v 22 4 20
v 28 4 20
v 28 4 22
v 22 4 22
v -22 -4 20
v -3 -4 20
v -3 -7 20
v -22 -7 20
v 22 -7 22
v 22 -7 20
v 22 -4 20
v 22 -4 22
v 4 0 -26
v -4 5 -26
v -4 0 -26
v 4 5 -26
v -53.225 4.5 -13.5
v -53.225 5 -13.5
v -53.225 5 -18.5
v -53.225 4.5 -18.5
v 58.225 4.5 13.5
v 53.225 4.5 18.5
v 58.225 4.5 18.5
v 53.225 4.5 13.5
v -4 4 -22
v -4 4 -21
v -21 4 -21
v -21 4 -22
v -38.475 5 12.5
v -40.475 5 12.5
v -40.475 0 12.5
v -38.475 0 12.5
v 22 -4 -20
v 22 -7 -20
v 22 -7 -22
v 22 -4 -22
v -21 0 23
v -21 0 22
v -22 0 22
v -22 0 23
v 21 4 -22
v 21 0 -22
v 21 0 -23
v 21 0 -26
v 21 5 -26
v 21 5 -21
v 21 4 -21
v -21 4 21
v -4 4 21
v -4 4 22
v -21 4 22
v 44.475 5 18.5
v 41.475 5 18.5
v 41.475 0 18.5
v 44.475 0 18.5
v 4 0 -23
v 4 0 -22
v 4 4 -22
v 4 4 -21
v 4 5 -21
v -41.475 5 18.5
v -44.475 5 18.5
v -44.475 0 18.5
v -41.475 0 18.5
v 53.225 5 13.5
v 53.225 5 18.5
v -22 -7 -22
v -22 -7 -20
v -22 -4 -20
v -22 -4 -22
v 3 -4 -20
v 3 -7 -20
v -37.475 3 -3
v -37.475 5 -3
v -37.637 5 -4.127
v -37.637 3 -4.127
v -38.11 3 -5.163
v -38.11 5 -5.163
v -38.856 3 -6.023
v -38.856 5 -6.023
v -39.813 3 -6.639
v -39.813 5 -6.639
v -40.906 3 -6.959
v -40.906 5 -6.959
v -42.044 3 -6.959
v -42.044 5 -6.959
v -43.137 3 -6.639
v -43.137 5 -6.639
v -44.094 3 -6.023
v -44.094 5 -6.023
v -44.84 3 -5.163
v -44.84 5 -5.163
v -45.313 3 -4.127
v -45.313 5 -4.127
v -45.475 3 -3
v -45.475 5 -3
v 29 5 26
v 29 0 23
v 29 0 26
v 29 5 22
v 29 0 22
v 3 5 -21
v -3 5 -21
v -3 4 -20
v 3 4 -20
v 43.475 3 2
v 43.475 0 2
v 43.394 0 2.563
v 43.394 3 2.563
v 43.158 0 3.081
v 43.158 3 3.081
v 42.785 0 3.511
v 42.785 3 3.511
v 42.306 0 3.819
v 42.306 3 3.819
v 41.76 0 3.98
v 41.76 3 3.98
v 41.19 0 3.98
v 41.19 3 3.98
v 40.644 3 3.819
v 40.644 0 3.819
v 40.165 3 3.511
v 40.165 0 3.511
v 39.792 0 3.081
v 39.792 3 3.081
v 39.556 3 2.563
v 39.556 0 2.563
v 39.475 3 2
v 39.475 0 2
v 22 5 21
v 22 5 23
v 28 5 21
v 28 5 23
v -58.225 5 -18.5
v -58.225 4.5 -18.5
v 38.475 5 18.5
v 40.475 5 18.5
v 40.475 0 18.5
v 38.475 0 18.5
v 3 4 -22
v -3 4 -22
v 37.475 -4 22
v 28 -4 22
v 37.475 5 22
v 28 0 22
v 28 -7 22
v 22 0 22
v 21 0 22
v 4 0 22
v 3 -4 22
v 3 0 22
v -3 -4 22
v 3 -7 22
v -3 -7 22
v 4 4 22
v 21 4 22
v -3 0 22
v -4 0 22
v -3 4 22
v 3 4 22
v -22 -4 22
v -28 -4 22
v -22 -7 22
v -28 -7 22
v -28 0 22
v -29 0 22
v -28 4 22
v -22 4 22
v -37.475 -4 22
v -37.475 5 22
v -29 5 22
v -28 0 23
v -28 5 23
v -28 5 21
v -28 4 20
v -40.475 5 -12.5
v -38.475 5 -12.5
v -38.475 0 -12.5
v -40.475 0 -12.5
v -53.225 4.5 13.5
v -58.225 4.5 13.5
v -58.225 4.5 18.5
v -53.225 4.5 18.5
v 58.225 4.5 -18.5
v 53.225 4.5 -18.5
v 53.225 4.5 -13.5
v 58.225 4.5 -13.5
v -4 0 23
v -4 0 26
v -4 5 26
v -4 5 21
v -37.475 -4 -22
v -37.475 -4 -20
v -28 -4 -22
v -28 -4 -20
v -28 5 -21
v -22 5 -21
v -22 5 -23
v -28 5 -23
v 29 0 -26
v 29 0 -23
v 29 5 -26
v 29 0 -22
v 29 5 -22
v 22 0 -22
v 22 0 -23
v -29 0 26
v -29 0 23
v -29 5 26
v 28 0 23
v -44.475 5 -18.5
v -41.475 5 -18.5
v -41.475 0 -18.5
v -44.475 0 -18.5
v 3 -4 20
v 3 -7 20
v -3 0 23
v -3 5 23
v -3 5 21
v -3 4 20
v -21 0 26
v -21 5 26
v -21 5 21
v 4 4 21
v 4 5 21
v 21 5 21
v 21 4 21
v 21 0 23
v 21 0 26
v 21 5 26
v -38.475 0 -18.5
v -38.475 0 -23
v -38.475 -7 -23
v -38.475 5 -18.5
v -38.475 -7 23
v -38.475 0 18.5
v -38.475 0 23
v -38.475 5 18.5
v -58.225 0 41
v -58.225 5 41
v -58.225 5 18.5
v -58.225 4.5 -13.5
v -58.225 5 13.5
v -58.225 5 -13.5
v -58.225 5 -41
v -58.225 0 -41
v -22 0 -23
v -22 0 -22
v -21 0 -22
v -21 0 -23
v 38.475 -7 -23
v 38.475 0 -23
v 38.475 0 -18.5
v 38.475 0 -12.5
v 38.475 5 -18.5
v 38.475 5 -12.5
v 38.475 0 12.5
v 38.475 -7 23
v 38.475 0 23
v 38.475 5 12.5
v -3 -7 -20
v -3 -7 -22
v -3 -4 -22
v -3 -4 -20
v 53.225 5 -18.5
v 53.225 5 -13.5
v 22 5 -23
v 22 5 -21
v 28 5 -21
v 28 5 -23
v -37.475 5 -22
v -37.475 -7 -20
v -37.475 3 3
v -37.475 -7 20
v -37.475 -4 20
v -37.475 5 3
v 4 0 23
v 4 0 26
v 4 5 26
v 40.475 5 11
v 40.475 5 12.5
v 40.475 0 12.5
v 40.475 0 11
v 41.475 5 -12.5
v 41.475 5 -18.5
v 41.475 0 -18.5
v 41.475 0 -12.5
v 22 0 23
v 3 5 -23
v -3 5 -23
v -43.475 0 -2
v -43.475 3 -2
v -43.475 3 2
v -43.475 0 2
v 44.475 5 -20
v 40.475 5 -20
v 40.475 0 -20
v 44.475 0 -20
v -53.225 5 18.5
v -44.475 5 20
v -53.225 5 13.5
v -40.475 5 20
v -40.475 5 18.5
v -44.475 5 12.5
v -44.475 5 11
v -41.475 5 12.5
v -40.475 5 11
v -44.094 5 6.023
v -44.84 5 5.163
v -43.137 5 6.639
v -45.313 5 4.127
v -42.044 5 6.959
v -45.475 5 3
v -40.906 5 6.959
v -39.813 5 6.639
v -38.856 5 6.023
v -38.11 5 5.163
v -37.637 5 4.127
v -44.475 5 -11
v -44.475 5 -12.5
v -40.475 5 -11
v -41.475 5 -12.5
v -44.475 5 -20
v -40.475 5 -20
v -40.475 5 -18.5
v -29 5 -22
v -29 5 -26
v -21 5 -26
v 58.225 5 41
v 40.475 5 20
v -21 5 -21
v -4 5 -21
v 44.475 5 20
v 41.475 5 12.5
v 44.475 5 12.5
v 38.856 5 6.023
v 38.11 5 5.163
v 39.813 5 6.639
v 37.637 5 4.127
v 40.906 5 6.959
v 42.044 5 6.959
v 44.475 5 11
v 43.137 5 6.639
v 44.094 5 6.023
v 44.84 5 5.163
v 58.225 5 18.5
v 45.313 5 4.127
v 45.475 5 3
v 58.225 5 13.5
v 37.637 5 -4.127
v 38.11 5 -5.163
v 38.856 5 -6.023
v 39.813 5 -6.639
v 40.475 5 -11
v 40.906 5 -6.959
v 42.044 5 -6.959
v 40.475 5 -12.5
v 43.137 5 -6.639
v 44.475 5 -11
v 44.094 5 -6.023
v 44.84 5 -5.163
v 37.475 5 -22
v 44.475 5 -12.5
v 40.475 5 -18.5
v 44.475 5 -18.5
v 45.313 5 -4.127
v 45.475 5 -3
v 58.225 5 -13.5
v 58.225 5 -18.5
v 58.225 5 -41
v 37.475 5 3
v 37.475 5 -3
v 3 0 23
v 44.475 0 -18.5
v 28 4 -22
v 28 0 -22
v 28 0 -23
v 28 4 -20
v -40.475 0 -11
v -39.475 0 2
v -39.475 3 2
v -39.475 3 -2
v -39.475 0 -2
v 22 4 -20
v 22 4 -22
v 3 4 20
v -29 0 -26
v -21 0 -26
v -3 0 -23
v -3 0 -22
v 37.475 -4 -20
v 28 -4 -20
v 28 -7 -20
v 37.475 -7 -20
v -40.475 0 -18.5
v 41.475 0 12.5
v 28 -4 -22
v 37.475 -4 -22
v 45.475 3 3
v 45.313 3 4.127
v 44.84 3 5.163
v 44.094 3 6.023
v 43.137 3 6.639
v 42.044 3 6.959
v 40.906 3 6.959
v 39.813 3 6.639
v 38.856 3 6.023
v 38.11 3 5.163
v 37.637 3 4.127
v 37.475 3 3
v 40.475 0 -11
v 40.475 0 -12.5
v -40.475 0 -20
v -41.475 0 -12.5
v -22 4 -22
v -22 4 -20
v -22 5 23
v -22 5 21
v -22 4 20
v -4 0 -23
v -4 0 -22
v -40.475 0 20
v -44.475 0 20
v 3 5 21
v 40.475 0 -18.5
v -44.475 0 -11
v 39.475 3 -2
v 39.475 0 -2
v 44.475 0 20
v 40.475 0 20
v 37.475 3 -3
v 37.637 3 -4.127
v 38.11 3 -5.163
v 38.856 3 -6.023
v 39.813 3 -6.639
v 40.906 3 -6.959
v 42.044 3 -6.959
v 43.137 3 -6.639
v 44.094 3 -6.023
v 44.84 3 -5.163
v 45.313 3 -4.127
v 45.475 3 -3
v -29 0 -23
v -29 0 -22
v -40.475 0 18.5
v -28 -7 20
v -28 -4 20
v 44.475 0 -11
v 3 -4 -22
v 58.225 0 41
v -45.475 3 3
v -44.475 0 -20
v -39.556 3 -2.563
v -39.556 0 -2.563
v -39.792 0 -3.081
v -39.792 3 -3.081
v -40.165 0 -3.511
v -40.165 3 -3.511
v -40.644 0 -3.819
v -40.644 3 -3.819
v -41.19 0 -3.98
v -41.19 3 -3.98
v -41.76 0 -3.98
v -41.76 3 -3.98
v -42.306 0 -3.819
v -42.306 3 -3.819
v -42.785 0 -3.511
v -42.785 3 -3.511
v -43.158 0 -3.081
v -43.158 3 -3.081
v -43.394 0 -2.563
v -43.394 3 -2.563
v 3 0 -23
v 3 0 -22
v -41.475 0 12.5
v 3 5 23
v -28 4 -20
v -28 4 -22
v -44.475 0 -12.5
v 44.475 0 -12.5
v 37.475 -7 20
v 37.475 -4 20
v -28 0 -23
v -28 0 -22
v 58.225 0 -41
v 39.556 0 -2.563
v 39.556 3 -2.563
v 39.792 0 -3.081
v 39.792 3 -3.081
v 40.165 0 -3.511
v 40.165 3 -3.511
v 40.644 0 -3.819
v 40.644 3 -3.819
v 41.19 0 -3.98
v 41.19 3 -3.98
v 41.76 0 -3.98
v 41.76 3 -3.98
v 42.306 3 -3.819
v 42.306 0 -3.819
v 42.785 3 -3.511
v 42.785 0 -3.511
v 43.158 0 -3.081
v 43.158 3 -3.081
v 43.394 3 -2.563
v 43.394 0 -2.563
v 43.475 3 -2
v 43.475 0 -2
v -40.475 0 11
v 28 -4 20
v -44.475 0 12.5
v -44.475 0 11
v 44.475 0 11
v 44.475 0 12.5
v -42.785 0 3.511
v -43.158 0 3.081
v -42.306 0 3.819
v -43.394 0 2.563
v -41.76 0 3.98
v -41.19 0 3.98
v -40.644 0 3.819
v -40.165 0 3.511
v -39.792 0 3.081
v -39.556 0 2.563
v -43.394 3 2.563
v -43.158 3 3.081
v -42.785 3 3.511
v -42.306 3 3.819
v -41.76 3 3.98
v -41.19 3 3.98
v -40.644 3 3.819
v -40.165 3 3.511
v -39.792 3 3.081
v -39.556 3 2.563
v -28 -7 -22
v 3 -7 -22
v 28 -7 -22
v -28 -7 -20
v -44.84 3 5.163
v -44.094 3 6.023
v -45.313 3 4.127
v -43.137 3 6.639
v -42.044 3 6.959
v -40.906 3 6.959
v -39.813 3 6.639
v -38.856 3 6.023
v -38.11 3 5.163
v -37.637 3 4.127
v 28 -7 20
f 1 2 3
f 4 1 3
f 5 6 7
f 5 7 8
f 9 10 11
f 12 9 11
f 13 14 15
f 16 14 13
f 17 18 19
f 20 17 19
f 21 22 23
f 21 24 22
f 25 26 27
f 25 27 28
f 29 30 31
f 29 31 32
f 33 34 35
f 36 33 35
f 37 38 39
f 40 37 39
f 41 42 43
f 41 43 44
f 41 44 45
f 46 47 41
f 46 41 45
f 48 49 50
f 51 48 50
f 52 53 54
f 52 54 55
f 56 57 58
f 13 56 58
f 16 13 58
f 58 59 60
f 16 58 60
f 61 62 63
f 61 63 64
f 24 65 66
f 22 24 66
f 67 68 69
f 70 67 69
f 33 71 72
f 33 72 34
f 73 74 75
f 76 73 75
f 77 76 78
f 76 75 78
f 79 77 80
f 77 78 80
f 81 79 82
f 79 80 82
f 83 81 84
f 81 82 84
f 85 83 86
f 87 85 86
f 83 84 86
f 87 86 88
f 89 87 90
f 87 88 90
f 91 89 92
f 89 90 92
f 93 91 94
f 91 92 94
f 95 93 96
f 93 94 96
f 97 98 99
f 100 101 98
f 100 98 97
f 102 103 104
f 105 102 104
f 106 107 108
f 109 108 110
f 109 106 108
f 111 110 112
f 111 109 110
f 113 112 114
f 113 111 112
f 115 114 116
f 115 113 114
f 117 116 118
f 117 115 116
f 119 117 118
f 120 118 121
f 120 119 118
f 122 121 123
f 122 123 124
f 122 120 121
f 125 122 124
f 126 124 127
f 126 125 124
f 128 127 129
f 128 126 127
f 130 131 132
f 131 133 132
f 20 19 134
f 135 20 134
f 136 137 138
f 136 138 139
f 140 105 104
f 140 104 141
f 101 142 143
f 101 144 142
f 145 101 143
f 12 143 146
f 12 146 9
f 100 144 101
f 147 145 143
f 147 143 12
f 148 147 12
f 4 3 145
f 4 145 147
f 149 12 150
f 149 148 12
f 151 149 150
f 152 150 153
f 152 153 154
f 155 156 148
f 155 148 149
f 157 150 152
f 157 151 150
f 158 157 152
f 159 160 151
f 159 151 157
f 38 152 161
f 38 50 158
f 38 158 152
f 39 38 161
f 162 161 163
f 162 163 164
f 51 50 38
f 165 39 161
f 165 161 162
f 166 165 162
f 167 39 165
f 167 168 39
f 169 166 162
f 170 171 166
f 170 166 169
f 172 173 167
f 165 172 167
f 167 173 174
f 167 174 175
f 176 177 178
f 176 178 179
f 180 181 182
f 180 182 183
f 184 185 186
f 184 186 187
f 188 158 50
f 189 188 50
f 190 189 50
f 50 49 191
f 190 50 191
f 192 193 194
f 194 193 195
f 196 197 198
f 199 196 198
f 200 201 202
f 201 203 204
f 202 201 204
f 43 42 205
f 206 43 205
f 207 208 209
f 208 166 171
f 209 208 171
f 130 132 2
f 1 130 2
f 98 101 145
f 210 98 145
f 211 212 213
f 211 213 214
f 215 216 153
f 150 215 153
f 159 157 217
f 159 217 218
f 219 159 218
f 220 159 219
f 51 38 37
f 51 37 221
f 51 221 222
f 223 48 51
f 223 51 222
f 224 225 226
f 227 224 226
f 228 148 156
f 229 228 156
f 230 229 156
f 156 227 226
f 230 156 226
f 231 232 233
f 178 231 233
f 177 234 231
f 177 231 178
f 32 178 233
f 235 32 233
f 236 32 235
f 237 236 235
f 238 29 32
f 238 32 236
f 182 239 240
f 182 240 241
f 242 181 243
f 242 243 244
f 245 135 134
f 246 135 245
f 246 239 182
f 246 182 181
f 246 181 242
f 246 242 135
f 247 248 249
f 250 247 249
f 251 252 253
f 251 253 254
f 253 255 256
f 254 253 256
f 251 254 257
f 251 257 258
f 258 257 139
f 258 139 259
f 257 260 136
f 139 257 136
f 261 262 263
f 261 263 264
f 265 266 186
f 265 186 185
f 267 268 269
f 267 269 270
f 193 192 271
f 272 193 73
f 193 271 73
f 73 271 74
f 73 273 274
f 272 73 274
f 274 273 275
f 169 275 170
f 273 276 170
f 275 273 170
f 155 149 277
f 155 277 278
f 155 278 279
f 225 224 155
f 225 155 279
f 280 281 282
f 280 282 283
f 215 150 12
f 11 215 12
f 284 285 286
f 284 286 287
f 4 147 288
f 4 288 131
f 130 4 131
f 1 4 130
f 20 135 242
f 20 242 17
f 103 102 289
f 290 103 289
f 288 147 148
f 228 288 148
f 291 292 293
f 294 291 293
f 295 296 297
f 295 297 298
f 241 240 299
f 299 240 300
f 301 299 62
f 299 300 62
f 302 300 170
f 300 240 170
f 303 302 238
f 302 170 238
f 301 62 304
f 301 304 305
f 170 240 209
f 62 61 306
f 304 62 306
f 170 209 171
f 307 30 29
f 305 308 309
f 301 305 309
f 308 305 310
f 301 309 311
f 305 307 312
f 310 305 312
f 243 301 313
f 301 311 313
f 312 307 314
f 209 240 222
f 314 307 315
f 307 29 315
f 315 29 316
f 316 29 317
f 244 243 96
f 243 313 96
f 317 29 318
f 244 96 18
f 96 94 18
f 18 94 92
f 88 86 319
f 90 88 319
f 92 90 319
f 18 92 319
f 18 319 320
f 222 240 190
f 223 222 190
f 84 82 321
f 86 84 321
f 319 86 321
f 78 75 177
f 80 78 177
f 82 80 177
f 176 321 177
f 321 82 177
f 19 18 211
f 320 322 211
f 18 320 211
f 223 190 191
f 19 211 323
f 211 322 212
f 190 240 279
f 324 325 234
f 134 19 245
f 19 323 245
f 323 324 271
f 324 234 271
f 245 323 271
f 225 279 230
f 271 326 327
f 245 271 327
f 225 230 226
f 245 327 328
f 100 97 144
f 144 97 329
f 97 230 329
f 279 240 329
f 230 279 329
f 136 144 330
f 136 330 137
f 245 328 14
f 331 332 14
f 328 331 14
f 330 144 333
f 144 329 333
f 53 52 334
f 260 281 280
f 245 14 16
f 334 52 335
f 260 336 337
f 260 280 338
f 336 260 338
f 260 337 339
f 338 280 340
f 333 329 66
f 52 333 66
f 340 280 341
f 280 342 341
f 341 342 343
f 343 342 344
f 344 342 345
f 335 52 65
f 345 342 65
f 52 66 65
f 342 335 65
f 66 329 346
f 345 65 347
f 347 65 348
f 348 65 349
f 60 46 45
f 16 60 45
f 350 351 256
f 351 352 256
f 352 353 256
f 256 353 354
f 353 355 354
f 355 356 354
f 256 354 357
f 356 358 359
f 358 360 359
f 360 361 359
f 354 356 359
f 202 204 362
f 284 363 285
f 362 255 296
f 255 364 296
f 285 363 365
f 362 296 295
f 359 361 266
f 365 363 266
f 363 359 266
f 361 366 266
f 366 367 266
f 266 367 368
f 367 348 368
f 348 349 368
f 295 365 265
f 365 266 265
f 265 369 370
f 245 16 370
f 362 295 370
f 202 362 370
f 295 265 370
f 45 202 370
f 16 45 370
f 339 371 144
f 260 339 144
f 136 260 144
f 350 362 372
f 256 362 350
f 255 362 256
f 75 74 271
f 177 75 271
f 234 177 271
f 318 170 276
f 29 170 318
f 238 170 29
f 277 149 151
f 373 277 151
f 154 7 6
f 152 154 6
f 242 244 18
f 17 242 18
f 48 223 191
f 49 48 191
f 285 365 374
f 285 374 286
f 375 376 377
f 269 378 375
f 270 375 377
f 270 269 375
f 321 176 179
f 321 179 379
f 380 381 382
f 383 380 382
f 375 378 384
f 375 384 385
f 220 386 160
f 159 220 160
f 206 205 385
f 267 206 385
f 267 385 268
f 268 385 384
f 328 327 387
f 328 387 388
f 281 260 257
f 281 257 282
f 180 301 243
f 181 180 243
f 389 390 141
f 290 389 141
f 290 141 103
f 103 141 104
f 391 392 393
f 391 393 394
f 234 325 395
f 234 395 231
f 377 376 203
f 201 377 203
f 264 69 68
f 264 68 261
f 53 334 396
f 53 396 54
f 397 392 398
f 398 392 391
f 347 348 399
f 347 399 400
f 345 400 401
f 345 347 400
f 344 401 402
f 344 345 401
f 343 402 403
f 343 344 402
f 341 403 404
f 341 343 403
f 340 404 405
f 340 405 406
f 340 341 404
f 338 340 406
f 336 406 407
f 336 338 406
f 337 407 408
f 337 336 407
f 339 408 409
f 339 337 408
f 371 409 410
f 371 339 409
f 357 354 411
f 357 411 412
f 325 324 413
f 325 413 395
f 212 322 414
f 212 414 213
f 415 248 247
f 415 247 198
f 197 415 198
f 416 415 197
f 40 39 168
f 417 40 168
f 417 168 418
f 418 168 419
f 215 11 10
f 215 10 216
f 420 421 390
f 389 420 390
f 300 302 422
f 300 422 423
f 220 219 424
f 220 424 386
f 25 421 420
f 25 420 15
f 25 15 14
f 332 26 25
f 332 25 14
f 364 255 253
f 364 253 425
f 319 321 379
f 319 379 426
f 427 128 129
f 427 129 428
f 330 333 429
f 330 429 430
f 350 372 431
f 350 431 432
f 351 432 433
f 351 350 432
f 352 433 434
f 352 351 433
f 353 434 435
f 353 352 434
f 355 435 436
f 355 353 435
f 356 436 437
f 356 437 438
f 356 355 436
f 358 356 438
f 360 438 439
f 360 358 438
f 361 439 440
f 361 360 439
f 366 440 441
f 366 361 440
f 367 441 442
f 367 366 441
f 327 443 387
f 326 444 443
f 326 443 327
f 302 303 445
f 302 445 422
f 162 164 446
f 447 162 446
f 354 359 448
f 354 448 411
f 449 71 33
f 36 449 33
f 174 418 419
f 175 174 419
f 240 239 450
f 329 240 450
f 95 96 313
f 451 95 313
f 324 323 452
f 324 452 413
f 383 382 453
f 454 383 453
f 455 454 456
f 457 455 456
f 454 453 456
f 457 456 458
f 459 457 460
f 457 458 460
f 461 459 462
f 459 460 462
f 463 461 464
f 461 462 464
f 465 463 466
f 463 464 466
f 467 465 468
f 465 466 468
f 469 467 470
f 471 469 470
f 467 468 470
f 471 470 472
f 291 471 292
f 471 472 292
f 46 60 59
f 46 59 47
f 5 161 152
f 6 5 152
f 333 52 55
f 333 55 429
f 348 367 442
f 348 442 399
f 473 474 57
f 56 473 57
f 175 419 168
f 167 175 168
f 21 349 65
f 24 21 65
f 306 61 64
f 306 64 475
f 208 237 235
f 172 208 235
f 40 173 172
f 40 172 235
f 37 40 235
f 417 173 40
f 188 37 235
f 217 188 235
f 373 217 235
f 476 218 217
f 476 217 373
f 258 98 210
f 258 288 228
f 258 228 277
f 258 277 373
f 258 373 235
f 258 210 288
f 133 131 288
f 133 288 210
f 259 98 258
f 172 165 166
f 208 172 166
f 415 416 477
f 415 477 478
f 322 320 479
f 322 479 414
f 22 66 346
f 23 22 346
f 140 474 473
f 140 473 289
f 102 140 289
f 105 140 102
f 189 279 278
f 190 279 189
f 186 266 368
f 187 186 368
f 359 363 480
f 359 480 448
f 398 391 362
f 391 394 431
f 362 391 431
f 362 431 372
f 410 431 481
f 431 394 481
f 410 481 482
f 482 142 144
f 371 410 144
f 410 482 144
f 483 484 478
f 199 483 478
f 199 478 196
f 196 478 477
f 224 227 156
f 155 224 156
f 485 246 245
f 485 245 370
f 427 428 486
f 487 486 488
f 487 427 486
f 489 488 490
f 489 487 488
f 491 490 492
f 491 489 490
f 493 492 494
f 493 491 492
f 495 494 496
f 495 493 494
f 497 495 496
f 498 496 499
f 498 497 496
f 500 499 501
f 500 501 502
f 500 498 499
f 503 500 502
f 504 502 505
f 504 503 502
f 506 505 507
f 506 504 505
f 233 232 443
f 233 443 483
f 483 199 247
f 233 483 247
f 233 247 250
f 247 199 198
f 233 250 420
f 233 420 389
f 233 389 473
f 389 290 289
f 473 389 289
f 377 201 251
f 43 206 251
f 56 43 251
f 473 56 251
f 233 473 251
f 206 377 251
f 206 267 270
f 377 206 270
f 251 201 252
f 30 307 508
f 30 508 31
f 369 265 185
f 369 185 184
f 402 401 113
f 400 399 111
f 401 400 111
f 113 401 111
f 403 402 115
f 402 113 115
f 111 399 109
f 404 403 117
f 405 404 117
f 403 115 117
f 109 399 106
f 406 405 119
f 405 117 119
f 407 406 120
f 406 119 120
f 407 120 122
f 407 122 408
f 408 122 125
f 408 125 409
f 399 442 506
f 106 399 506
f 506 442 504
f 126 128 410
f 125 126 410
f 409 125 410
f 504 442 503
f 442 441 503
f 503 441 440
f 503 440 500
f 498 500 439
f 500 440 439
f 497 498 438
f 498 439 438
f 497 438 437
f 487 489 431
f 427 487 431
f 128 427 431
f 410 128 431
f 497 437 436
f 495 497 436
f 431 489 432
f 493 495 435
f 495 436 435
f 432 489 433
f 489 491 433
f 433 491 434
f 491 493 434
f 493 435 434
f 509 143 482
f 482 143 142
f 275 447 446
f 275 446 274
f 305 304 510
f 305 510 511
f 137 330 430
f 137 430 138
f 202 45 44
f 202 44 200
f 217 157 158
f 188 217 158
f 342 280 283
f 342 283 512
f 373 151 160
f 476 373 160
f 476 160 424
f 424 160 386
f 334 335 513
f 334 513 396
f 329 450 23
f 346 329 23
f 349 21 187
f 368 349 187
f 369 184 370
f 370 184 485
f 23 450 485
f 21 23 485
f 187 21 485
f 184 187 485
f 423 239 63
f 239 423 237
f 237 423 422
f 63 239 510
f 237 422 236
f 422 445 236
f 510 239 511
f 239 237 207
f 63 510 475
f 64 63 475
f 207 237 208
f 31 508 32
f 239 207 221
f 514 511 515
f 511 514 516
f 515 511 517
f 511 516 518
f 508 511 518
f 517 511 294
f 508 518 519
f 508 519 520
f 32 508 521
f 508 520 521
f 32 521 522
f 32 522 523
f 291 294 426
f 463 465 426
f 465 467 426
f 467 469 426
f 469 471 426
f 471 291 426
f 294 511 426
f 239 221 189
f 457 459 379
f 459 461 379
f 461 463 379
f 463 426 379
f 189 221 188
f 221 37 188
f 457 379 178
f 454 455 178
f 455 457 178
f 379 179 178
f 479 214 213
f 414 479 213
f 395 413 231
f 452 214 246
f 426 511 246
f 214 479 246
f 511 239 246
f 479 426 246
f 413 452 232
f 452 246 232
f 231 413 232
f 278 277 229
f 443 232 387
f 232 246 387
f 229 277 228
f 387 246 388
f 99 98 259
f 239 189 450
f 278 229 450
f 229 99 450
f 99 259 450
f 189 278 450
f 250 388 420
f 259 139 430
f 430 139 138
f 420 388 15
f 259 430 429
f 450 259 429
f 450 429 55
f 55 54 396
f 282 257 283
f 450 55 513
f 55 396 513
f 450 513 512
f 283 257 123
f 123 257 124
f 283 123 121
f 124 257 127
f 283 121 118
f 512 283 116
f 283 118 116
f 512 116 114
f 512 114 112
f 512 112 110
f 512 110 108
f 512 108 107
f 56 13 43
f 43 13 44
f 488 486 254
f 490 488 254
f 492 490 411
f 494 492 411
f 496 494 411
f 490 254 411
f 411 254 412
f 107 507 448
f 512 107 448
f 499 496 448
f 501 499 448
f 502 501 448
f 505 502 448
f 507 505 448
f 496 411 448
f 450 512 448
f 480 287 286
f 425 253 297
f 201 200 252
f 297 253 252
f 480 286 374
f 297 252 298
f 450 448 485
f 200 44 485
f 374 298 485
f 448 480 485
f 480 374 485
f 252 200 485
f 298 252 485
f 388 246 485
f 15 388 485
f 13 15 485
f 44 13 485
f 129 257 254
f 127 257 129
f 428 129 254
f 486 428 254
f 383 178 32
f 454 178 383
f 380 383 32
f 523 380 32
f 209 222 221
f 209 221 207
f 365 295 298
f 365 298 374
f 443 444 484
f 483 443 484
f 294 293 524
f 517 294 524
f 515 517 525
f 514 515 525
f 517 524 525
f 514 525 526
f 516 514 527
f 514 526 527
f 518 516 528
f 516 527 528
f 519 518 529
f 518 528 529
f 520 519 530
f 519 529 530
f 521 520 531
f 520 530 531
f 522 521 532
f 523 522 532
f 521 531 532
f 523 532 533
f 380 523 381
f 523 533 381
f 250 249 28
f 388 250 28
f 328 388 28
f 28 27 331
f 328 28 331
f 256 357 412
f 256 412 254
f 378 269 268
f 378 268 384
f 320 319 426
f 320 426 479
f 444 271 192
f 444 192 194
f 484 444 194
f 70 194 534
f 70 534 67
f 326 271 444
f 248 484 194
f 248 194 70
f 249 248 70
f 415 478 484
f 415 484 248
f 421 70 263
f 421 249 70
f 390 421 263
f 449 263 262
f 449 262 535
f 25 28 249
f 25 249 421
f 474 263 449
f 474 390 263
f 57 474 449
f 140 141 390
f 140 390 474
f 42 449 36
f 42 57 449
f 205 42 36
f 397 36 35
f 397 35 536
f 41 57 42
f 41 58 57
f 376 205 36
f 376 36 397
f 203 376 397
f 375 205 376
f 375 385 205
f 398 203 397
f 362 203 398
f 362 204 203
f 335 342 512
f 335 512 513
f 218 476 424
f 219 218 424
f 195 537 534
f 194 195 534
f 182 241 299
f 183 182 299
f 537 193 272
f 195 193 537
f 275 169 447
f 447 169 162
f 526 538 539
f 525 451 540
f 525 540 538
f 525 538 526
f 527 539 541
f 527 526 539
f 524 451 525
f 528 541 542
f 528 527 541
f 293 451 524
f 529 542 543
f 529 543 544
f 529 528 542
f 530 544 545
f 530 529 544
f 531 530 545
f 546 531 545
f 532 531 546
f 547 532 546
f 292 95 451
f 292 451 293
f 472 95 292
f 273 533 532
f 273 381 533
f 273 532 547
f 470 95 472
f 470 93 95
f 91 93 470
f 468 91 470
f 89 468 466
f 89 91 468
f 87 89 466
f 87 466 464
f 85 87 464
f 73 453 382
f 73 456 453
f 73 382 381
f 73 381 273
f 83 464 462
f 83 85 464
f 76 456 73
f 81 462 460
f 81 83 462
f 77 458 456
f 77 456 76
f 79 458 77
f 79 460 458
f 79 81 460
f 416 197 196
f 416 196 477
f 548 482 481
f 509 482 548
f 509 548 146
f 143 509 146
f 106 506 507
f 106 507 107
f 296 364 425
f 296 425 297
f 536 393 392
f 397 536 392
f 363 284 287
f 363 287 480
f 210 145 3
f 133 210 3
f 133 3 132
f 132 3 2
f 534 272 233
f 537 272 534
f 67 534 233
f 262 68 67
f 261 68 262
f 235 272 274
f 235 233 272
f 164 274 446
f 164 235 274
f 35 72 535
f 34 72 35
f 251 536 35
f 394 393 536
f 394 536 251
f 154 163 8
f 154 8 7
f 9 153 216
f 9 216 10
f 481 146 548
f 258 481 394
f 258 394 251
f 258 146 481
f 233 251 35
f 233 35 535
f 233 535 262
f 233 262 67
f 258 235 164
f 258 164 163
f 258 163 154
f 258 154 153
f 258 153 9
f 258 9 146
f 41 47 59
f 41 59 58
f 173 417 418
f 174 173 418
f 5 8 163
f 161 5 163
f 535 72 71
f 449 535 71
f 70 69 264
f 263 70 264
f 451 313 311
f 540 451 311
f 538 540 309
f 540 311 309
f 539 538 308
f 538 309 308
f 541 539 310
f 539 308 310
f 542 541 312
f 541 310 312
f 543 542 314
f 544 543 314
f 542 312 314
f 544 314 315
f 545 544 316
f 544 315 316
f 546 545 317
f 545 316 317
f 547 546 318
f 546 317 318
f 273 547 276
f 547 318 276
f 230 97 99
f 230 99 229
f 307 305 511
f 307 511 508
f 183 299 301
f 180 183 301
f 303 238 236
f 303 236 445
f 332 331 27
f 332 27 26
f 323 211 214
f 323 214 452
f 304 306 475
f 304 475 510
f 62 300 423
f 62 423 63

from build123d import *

# Parameters (mm, degrees)
CROQUIS1_W              = 116.45
CROQUIS1_H              = 82
SALIENTE_EXTRUIR2_DEPTH = 5
CROQUIS2_W              = 74.95
CROQUIS2_H              = 44
CORTAR_EXTRUIR1_DEPTH   = 5
CROQUIS3_W              = 76.95
CROQUIS3_H              = 46
CROQUIS3_W_2            = 74.95
CROQUIS3_H_2            = 44
SALIENTE_EXTRUIR3_DEPTH = 7
CROQUIS4_W              = 74.95
CROQUIS4_H              = 3
SALIENTE_EXTRUIR4_DEPTH = 3
CROQUIS5_W              = 3
CROQUIS5_H              = 2
CORTAR_EXTRUIR9_DEPTH   = 3
CROQUIS9_W              = 6
CROQUIS9_H              = 3
CORTAR_EXTRUIR10_DEPTH  = 1
CROQUIS10_W             = 74.95
CROQUIS10_H             = 3
CORTAR_EXTRUIR11_DEPTH  = 1
CROQUIS11_W             = 6
CROQUIS11_H             = 3
CORTAR_EXTRUIR12_DEPTH  = 1
CROQUIS12_W             = 74.95
CROQUIS12_H             = 3
CORTAR_EXTRUIR13_DEPTH  = 1
CROQUIS13_W             = 1
CROQUIS13_H             = 5
CORTAR_EXTRUIR21_DEPTH  = 4
CROQUIS14_W             = 1
CROQUIS14_H             = 5
CORTAR_EXTRUIR22_DEPTH  = 4
CROQUIS15_W             = 8
CROQUIS15_H             = 3
CORTAR_EXTRUIR23_DEPTH  = 16
SALIENTE_EXTRUIR8_DEPTH = 70
SALIENTE_EXTRUIR9_DEPTH = 70
CROQUIS18_W             = 19
CROQUIS18_H             = 42
CORTAR_EXTRUIR24_DEPTH  = 8
CROQUIS19_W             = 9.475
CROQUIS19_H             = 44
CORTAR_EXTRUIR26_DEPTH  = 8
CROQUIS20_W             = 1
CROQUIS20_H             = 44
CORTAR_EXTRUIR27_DEPTH  = 4
CROQUIS21_W             = 5
CROQUIS21_H             = 5
CORTAR_EXTRUIR28_DEPTH  = 0.5
CORTAR_EXTRUIR29_DEPTH  = 5
CORTAR_EXTRUIR30_DEPTH  = 2
CORTAR_EXTRUIR31_DEPTH  = 5


with BuildPart() as part:
    # Croquis1 → Saliente-Extruir2 (new body)
    with BuildSketch(Plane(origin=(0, 0, 0), x_dir=(1, 0, 0), z_dir=(0, 1, 0))):
        Rectangle(CROQUIS1_W, CROQUIS1_H)
    extrude(amount=SALIENTE_EXTRUIR2_DEPTH)

    # Croquis2 → Cortar-Extruir1 (cut)
    with BuildSketch(Plane(origin=(0, 5, 0), x_dir=(1, 0, 0), z_dir=(0, 1, 0))):
        Rectangle(CROQUIS2_W, CROQUIS2_H)
    extrude(amount=-CORTAR_EXTRUIR1_DEPTH, mode=Mode.SUBTRACT)

    # Croquis3 → Saliente-Extruir3 (add)
    with BuildSketch(Plane.XZ):
        Rectangle(CROQUIS3_W, CROQUIS3_H)
        Rectangle(CROQUIS3_W_2, CROQUIS3_H_2, mode=Mode.SUBTRACT)
    extrude(amount=SALIENTE_EXTRUIR3_DEPTH)

    # Croquis4 → Saliente-Extruir4 (add)
    with BuildSketch(Plane.XZ.offset(7)):
        with Locations((0, 20.5)):
            Rectangle(CROQUIS4_W, CROQUIS4_H)
        with Locations((0, -20.5)):
            Rectangle(CROQUIS4_W, CROQUIS4_H)
    extrude(amount=-SALIENTE_EXTRUIR4_DEPTH)

    # Croquis5 → Cortar-Extruir9 (cut)
    with BuildSketch(Plane.XZ.offset(7)):
        Polygon((25, -19), (22, -19), (22, -21), (28, -21), (28, -19), align=None)
        Polygon((22, 21), (22, 19), (25, 19), (28, 19), (28, 21), align=None)
        with Locations((1.5, 20)):
            Rectangle(CROQUIS5_W, CROQUIS5_H)
        with Locations((-1.5, 20)):
            Rectangle(CROQUIS5_W, CROQUIS5_H)
        with Locations((-1.5, -20)):
            Rectangle(CROQUIS5_W, CROQUIS5_H)
        with Locations((1.5, -20)):
            Rectangle(CROQUIS5_W, CROQUIS5_H)
        Polygon((-22, -21), (-22, -19), (-25, -19), (-28, -19), (-28, -21), align=None)
        Polygon((-25, 19), (-22, 19), (-22, 21), (-28, 21), (-28, 19), align=None)
    extrude(amount=-CORTAR_EXTRUIR9_DEPTH, mode=Mode.SUBTRACT)

    # Croquis9 → Cortar-Extruir10 (cut)
    with BuildSketch(Plane(origin=(0, 0, 21), x_dir=(-1, 0, 0), z_dir=(0, 0, -1))):
        with Locations((25, -5.5)):
            Rectangle(CROQUIS9_W, CROQUIS9_H)
        with Locations((0, -5.5)):
            Rectangle(CROQUIS9_W, CROQUIS9_H)
        with Locations((-25, -5.5)):
            Rectangle(CROQUIS9_W, CROQUIS9_H)
    extrude(amount=-CORTAR_EXTRUIR10_DEPTH, mode=Mode.SUBTRACT)

    # Croquis10 → Cortar-Extruir11 (cut)
    with BuildSketch(Plane(origin=(0, 0, 19), x_dir=(-1, 0, 0), z_dir=(0, 0, -1))):
        with Locations((0, -5.5)):
            Rectangle(CROQUIS10_W, CROQUIS10_H)
    extrude(amount=-CORTAR_EXTRUIR11_DEPTH, mode=Mode.SUBTRACT)

    # Croquis11 → Cortar-Extruir12 (cut)
    with BuildSketch(Plane.XY.offset(-21)):
        with Locations((25, -5.5)):
            Rectangle(CROQUIS11_W, CROQUIS11_H)
        with Locations((0, -5.5)):
            Rectangle(CROQUIS11_W, CROQUIS11_H)
        with Locations((-25, -5.5)):
            Rectangle(CROQUIS11_W, CROQUIS11_H)
    extrude(amount=-CORTAR_EXTRUIR12_DEPTH, mode=Mode.SUBTRACT)

    # Croquis12 → Cortar-Extruir13 (cut)
    with BuildSketch(Plane.XY.offset(-19)):
        with Locations((0, -5.5)):
            Rectangle(CROQUIS12_W, CROQUIS12_H)
    extrude(amount=-CORTAR_EXTRUIR13_DEPTH, mode=Mode.SUBTRACT)

    # Croquis13 → Cortar-Extruir21 (cut)
    with BuildSketch(Plane.XY.offset(-22)):
        with Locations((21.5, 2.5)):
            Rectangle(CROQUIS13_W, CROQUIS13_H)
        with Locations((3.5, 2.5)):
            Rectangle(CROQUIS13_W, CROQUIS13_H)
        with Locations((-3.5, 2.5)):
            Rectangle(CROQUIS13_W, CROQUIS13_H)
        with Locations((-28.5, 2.5)):
            Rectangle(CROQUIS13_W, CROQUIS13_H)
        with Locations((-21.5, 2.5)):
            Rectangle(CROQUIS13_W, CROQUIS13_H)
        with Locations((28.5, 2.5)):
            Rectangle(CROQUIS13_W, CROQUIS13_H)
    extrude(amount=-CORTAR_EXTRUIR21_DEPTH, mode=Mode.SUBTRACT)

    # Croquis14 → Cortar-Extruir22 (cut)
    with BuildSketch(Plane(origin=(0, 0, 22), x_dir=(-1, 0, 0), z_dir=(0, 0, -1))):
        with Locations((28.5, 2.5)):
            Rectangle(CROQUIS14_W, CROQUIS14_H)
        with Locations((-21.5, 2.5)):
            Rectangle(CROQUIS14_W, CROQUIS14_H)
        with Locations((21.5, 2.5)):
            Rectangle(CROQUIS14_W, CROQUIS14_H)
        with Locations((3.5, 2.5)):
            Rectangle(CROQUIS14_W, CROQUIS14_H)
        with Locations((-3.5, 2.5)):
            Rectangle(CROQUIS14_W, CROQUIS14_H)
        with Locations((-28.5, 2.5)):
            Rectangle(CROQUIS14_W, CROQUIS14_H)
    extrude(amount=-CORTAR_EXTRUIR22_DEPTH, mode=Mode.SUBTRACT)

    # Croquis15 → Cortar-Extruir23 (cut)
    with BuildSketch(Plane.XZ):
        with Locations((0, 24.5)):
            Rectangle(CROQUIS15_W, CROQUIS15_H)
        with Locations((-25, 24.5)):
            Rectangle(CROQUIS15_W, CROQUIS15_H)
        with Locations((25, 24.5)):
            Rectangle(CROQUIS15_W, CROQUIS15_H)
        with Locations((-25, -24.5)):
            Rectangle(CROQUIS15_W, CROQUIS15_H)
        with Locations((0, -24.5)):
            Rectangle(CROQUIS15_W, CROQUIS15_H)
        with Locations((25, -24.5)):
            Rectangle(CROQUIS15_W, CROQUIS15_H)
    extrude(amount=-CORTAR_EXTRUIR23_DEPTH, mode=Mode.SUBTRACT)

    # Croquis16 → Saliente-Extruir8 (add)
    with BuildSketch(Plane.ZY.offset(-37.475)):
        Polygon((-22, 5), (-21, 5), (-20, 4), (-22, 4), align=None)
    extrude(amount=SALIENTE_EXTRUIR8_DEPTH)

    # Croquis17 → Saliente-Extruir9 (add)
    with BuildSketch(Plane.ZY.offset(-37.475)):
        Polygon((22, 4), (22, 5), (21, 5), (20, 4), (21, 4), align=None)
    extrude(amount=SALIENTE_EXTRUIR9_DEPTH)

    # Croquis18 → Cortar-Extruir24 (cut)
    with BuildSketch(Plane(origin=(0, 5, 0), x_dir=(1, 0, 0), z_dir=(0, 1, 0))):
        with Locations((-12.5, 0)):
            Rectangle(CROQUIS18_W, CROQUIS18_H)
        with Locations((12.5, 0)):
            Rectangle(CROQUIS18_W, CROQUIS18_H)
    extrude(amount=-CORTAR_EXTRUIR24_DEPTH, mode=Mode.SUBTRACT)

    # Croquis19 → Cortar-Extruir26 (cut)
    with BuildSketch(Plane(origin=(0, 5, 0), x_dir=(1, 0, 0), z_dir=(0, 1, 0))):
        with Locations((32.7375, 0)):
            Rectangle(CROQUIS19_W, CROQUIS19_H)
        with Locations((-32.7375, 0)):
            Rectangle(CROQUIS19_W, CROQUIS19_H)
    extrude(amount=-CORTAR_EXTRUIR26_DEPTH, mode=Mode.SUBTRACT)

    # Croquis20 → Cortar-Extruir27 (cut)
    with BuildSketch(Plane(origin=(0, 5, 0), x_dir=(1, 0, 0), z_dir=(0, 1, 0))):
        with Locations((-3.5, 0)):
            Rectangle(CROQUIS20_W, CROQUIS20_H)
        with Locations((-21.5, 0)):
            Rectangle(CROQUIS20_W, CROQUIS20_H)
        with Locations((3.5, 0)):
            Rectangle(CROQUIS20_W, CROQUIS20_H)
        with Locations((21.5, 0)):
            Rectangle(CROQUIS20_W, CROQUIS20_H)
    extrude(amount=-CORTAR_EXTRUIR27_DEPTH, mode=Mode.SUBTRACT)

    # Croquis21 → Cortar-Extruir28 (cut)
    with BuildSketch(Plane(origin=(0, 5, 0), x_dir=(1, 0, 0), z_dir=(0, 1, 0))):
        Polygon((-53.225, -13.5), (-58.225, -13.5), (-58.225, -18.5), (-53.225, -18.5), (-53.225, -16), align=None)
        Polygon((-53.225, 18.5), (-58.225, 18.5), (-58.225, 13.5), (-53.225, 13.5), (-53.225, 16), align=None)
        Polygon((53.225, -18.5), (58.225, -18.5), (58.225, -13.5), (53.225, -13.5), (53.225, -16), align=None)
        with Locations((55.725, 16)):
            Rectangle(CROQUIS21_W, CROQUIS21_H)
    extrude(amount=-CORTAR_EXTRUIR28_DEPTH, mode=Mode.SUBTRACT)

    # Croquis22 → Cortar-Extruir29 (cut)
    with BuildSketch(Plane(origin=(0, 5, 0), x_dir=(1, 0, 0), z_dir=(0, 1, 0))):
        with BuildLine():
            Line((-39.475, -2), (-39.475, 2))
            ThreePointArc((-39.475, 2), (-41.475, 4), (-43.475, 2))
            Line((-43.475, 2), (-43.475, -2))
            ThreePointArc((-43.475, -2), (-41.475, -4), (-39.475, -2))
        make_face()
        with BuildLine():
            ThreePointArc((43.475, -2), (41.475, -4), (39.475, -2))
            Line((39.475, -2), (39.475, 2))
            ThreePointArc((39.475, 2), (41.475, 4), (43.475, 2))
            Line((43.475, 2), (43.475, -2))
        make_face()
    extrude(amount=-CORTAR_EXTRUIR29_DEPTH, mode=Mode.SUBTRACT)

    # Croquis23 → Cortar-Extruir30 (cut)
    with BuildSketch(Plane(origin=(0, 5, 0), x_dir=(1, 0, 0), z_dir=(0, 1, 0))):
        with BuildLine():
            Line((-37.475, 0), (-37.475, 3))
            ThreePointArc((-37.475, 3), (-41.475, 7), (-45.475, 3))
            Line((-45.475, 3), (-45.475, -3))
            ThreePointArc((-45.475, -3), (-41.475, -7), (-37.475, -3))
            Line((-37.475, -3), (-37.475, 0))
        make_face()
        with BuildLine():
            ThreePointArc((45.475, -3), (41.475, -7), (37.475, -3))
            Line((37.475, -3), (37.475, 0))
            Line((37.475, 0), (37.475, 3))
            ThreePointArc((37.475, 3), (41.475, 7), (45.475, 3))
            Line((45.475, 3), (45.475, -3))
        make_face()
    extrude(amount=-CORTAR_EXTRUIR30_DEPTH, mode=Mode.SUBTRACT)

    # Croquis24 → Cortar-Extruir31 (cut)
    with BuildSketch(Plane(origin=(0, 5, 0), x_dir=(1, 0, 0), z_dir=(0, 1, 0))):
        Polygon((-38.475, -12.5), (-38.475, -18.5), (-40.475, -18.5), (-40.475, -20), (-44.475, -20), (-44.475, -18.5), (-41.475, -18.5), (-41.475, -12.5), (-44.475, -12.5), (-44.475, -11), (-40.475, -11), (-40.475, -12.5), align=None)
        Polygon((-38.475, 12.5), (-40.475, 12.5), (-40.475, 11), (-44.475, 11), (-44.475, 12.5), (-41.475, 12.5), (-41.475, 18.5), (-44.475, 18.5), (-44.475, 20), (-40.475, 20), (-40.475, 18.5), (-38.475, 18.5), align=None)
        Polygon((38.475, 12.5), (38.475, 18.5), (40.475, 18.5), (40.475, 20), (44.475, 20), (44.475, 18.5), (41.475, 18.5), (41.475, 12.5), (44.475, 12.5), (44.475, 11), (40.475, 11), (40.475, 12.5), align=None)
        Polygon((38.475, -12.5), (40.475, -12.5), (40.475, -11), (44.475, -11), (44.475, -12.5), (41.475, -12.5), (41.475, -18.5), (44.475, -18.5), (44.475, -20), (40.475, -20), (40.475, -18.5), (38.475, -18.5), align=None)
    extrude(amount=-CORTAR_EXTRUIR31_DEPTH, mode=Mode.SUBTRACT)


solid = part.part
